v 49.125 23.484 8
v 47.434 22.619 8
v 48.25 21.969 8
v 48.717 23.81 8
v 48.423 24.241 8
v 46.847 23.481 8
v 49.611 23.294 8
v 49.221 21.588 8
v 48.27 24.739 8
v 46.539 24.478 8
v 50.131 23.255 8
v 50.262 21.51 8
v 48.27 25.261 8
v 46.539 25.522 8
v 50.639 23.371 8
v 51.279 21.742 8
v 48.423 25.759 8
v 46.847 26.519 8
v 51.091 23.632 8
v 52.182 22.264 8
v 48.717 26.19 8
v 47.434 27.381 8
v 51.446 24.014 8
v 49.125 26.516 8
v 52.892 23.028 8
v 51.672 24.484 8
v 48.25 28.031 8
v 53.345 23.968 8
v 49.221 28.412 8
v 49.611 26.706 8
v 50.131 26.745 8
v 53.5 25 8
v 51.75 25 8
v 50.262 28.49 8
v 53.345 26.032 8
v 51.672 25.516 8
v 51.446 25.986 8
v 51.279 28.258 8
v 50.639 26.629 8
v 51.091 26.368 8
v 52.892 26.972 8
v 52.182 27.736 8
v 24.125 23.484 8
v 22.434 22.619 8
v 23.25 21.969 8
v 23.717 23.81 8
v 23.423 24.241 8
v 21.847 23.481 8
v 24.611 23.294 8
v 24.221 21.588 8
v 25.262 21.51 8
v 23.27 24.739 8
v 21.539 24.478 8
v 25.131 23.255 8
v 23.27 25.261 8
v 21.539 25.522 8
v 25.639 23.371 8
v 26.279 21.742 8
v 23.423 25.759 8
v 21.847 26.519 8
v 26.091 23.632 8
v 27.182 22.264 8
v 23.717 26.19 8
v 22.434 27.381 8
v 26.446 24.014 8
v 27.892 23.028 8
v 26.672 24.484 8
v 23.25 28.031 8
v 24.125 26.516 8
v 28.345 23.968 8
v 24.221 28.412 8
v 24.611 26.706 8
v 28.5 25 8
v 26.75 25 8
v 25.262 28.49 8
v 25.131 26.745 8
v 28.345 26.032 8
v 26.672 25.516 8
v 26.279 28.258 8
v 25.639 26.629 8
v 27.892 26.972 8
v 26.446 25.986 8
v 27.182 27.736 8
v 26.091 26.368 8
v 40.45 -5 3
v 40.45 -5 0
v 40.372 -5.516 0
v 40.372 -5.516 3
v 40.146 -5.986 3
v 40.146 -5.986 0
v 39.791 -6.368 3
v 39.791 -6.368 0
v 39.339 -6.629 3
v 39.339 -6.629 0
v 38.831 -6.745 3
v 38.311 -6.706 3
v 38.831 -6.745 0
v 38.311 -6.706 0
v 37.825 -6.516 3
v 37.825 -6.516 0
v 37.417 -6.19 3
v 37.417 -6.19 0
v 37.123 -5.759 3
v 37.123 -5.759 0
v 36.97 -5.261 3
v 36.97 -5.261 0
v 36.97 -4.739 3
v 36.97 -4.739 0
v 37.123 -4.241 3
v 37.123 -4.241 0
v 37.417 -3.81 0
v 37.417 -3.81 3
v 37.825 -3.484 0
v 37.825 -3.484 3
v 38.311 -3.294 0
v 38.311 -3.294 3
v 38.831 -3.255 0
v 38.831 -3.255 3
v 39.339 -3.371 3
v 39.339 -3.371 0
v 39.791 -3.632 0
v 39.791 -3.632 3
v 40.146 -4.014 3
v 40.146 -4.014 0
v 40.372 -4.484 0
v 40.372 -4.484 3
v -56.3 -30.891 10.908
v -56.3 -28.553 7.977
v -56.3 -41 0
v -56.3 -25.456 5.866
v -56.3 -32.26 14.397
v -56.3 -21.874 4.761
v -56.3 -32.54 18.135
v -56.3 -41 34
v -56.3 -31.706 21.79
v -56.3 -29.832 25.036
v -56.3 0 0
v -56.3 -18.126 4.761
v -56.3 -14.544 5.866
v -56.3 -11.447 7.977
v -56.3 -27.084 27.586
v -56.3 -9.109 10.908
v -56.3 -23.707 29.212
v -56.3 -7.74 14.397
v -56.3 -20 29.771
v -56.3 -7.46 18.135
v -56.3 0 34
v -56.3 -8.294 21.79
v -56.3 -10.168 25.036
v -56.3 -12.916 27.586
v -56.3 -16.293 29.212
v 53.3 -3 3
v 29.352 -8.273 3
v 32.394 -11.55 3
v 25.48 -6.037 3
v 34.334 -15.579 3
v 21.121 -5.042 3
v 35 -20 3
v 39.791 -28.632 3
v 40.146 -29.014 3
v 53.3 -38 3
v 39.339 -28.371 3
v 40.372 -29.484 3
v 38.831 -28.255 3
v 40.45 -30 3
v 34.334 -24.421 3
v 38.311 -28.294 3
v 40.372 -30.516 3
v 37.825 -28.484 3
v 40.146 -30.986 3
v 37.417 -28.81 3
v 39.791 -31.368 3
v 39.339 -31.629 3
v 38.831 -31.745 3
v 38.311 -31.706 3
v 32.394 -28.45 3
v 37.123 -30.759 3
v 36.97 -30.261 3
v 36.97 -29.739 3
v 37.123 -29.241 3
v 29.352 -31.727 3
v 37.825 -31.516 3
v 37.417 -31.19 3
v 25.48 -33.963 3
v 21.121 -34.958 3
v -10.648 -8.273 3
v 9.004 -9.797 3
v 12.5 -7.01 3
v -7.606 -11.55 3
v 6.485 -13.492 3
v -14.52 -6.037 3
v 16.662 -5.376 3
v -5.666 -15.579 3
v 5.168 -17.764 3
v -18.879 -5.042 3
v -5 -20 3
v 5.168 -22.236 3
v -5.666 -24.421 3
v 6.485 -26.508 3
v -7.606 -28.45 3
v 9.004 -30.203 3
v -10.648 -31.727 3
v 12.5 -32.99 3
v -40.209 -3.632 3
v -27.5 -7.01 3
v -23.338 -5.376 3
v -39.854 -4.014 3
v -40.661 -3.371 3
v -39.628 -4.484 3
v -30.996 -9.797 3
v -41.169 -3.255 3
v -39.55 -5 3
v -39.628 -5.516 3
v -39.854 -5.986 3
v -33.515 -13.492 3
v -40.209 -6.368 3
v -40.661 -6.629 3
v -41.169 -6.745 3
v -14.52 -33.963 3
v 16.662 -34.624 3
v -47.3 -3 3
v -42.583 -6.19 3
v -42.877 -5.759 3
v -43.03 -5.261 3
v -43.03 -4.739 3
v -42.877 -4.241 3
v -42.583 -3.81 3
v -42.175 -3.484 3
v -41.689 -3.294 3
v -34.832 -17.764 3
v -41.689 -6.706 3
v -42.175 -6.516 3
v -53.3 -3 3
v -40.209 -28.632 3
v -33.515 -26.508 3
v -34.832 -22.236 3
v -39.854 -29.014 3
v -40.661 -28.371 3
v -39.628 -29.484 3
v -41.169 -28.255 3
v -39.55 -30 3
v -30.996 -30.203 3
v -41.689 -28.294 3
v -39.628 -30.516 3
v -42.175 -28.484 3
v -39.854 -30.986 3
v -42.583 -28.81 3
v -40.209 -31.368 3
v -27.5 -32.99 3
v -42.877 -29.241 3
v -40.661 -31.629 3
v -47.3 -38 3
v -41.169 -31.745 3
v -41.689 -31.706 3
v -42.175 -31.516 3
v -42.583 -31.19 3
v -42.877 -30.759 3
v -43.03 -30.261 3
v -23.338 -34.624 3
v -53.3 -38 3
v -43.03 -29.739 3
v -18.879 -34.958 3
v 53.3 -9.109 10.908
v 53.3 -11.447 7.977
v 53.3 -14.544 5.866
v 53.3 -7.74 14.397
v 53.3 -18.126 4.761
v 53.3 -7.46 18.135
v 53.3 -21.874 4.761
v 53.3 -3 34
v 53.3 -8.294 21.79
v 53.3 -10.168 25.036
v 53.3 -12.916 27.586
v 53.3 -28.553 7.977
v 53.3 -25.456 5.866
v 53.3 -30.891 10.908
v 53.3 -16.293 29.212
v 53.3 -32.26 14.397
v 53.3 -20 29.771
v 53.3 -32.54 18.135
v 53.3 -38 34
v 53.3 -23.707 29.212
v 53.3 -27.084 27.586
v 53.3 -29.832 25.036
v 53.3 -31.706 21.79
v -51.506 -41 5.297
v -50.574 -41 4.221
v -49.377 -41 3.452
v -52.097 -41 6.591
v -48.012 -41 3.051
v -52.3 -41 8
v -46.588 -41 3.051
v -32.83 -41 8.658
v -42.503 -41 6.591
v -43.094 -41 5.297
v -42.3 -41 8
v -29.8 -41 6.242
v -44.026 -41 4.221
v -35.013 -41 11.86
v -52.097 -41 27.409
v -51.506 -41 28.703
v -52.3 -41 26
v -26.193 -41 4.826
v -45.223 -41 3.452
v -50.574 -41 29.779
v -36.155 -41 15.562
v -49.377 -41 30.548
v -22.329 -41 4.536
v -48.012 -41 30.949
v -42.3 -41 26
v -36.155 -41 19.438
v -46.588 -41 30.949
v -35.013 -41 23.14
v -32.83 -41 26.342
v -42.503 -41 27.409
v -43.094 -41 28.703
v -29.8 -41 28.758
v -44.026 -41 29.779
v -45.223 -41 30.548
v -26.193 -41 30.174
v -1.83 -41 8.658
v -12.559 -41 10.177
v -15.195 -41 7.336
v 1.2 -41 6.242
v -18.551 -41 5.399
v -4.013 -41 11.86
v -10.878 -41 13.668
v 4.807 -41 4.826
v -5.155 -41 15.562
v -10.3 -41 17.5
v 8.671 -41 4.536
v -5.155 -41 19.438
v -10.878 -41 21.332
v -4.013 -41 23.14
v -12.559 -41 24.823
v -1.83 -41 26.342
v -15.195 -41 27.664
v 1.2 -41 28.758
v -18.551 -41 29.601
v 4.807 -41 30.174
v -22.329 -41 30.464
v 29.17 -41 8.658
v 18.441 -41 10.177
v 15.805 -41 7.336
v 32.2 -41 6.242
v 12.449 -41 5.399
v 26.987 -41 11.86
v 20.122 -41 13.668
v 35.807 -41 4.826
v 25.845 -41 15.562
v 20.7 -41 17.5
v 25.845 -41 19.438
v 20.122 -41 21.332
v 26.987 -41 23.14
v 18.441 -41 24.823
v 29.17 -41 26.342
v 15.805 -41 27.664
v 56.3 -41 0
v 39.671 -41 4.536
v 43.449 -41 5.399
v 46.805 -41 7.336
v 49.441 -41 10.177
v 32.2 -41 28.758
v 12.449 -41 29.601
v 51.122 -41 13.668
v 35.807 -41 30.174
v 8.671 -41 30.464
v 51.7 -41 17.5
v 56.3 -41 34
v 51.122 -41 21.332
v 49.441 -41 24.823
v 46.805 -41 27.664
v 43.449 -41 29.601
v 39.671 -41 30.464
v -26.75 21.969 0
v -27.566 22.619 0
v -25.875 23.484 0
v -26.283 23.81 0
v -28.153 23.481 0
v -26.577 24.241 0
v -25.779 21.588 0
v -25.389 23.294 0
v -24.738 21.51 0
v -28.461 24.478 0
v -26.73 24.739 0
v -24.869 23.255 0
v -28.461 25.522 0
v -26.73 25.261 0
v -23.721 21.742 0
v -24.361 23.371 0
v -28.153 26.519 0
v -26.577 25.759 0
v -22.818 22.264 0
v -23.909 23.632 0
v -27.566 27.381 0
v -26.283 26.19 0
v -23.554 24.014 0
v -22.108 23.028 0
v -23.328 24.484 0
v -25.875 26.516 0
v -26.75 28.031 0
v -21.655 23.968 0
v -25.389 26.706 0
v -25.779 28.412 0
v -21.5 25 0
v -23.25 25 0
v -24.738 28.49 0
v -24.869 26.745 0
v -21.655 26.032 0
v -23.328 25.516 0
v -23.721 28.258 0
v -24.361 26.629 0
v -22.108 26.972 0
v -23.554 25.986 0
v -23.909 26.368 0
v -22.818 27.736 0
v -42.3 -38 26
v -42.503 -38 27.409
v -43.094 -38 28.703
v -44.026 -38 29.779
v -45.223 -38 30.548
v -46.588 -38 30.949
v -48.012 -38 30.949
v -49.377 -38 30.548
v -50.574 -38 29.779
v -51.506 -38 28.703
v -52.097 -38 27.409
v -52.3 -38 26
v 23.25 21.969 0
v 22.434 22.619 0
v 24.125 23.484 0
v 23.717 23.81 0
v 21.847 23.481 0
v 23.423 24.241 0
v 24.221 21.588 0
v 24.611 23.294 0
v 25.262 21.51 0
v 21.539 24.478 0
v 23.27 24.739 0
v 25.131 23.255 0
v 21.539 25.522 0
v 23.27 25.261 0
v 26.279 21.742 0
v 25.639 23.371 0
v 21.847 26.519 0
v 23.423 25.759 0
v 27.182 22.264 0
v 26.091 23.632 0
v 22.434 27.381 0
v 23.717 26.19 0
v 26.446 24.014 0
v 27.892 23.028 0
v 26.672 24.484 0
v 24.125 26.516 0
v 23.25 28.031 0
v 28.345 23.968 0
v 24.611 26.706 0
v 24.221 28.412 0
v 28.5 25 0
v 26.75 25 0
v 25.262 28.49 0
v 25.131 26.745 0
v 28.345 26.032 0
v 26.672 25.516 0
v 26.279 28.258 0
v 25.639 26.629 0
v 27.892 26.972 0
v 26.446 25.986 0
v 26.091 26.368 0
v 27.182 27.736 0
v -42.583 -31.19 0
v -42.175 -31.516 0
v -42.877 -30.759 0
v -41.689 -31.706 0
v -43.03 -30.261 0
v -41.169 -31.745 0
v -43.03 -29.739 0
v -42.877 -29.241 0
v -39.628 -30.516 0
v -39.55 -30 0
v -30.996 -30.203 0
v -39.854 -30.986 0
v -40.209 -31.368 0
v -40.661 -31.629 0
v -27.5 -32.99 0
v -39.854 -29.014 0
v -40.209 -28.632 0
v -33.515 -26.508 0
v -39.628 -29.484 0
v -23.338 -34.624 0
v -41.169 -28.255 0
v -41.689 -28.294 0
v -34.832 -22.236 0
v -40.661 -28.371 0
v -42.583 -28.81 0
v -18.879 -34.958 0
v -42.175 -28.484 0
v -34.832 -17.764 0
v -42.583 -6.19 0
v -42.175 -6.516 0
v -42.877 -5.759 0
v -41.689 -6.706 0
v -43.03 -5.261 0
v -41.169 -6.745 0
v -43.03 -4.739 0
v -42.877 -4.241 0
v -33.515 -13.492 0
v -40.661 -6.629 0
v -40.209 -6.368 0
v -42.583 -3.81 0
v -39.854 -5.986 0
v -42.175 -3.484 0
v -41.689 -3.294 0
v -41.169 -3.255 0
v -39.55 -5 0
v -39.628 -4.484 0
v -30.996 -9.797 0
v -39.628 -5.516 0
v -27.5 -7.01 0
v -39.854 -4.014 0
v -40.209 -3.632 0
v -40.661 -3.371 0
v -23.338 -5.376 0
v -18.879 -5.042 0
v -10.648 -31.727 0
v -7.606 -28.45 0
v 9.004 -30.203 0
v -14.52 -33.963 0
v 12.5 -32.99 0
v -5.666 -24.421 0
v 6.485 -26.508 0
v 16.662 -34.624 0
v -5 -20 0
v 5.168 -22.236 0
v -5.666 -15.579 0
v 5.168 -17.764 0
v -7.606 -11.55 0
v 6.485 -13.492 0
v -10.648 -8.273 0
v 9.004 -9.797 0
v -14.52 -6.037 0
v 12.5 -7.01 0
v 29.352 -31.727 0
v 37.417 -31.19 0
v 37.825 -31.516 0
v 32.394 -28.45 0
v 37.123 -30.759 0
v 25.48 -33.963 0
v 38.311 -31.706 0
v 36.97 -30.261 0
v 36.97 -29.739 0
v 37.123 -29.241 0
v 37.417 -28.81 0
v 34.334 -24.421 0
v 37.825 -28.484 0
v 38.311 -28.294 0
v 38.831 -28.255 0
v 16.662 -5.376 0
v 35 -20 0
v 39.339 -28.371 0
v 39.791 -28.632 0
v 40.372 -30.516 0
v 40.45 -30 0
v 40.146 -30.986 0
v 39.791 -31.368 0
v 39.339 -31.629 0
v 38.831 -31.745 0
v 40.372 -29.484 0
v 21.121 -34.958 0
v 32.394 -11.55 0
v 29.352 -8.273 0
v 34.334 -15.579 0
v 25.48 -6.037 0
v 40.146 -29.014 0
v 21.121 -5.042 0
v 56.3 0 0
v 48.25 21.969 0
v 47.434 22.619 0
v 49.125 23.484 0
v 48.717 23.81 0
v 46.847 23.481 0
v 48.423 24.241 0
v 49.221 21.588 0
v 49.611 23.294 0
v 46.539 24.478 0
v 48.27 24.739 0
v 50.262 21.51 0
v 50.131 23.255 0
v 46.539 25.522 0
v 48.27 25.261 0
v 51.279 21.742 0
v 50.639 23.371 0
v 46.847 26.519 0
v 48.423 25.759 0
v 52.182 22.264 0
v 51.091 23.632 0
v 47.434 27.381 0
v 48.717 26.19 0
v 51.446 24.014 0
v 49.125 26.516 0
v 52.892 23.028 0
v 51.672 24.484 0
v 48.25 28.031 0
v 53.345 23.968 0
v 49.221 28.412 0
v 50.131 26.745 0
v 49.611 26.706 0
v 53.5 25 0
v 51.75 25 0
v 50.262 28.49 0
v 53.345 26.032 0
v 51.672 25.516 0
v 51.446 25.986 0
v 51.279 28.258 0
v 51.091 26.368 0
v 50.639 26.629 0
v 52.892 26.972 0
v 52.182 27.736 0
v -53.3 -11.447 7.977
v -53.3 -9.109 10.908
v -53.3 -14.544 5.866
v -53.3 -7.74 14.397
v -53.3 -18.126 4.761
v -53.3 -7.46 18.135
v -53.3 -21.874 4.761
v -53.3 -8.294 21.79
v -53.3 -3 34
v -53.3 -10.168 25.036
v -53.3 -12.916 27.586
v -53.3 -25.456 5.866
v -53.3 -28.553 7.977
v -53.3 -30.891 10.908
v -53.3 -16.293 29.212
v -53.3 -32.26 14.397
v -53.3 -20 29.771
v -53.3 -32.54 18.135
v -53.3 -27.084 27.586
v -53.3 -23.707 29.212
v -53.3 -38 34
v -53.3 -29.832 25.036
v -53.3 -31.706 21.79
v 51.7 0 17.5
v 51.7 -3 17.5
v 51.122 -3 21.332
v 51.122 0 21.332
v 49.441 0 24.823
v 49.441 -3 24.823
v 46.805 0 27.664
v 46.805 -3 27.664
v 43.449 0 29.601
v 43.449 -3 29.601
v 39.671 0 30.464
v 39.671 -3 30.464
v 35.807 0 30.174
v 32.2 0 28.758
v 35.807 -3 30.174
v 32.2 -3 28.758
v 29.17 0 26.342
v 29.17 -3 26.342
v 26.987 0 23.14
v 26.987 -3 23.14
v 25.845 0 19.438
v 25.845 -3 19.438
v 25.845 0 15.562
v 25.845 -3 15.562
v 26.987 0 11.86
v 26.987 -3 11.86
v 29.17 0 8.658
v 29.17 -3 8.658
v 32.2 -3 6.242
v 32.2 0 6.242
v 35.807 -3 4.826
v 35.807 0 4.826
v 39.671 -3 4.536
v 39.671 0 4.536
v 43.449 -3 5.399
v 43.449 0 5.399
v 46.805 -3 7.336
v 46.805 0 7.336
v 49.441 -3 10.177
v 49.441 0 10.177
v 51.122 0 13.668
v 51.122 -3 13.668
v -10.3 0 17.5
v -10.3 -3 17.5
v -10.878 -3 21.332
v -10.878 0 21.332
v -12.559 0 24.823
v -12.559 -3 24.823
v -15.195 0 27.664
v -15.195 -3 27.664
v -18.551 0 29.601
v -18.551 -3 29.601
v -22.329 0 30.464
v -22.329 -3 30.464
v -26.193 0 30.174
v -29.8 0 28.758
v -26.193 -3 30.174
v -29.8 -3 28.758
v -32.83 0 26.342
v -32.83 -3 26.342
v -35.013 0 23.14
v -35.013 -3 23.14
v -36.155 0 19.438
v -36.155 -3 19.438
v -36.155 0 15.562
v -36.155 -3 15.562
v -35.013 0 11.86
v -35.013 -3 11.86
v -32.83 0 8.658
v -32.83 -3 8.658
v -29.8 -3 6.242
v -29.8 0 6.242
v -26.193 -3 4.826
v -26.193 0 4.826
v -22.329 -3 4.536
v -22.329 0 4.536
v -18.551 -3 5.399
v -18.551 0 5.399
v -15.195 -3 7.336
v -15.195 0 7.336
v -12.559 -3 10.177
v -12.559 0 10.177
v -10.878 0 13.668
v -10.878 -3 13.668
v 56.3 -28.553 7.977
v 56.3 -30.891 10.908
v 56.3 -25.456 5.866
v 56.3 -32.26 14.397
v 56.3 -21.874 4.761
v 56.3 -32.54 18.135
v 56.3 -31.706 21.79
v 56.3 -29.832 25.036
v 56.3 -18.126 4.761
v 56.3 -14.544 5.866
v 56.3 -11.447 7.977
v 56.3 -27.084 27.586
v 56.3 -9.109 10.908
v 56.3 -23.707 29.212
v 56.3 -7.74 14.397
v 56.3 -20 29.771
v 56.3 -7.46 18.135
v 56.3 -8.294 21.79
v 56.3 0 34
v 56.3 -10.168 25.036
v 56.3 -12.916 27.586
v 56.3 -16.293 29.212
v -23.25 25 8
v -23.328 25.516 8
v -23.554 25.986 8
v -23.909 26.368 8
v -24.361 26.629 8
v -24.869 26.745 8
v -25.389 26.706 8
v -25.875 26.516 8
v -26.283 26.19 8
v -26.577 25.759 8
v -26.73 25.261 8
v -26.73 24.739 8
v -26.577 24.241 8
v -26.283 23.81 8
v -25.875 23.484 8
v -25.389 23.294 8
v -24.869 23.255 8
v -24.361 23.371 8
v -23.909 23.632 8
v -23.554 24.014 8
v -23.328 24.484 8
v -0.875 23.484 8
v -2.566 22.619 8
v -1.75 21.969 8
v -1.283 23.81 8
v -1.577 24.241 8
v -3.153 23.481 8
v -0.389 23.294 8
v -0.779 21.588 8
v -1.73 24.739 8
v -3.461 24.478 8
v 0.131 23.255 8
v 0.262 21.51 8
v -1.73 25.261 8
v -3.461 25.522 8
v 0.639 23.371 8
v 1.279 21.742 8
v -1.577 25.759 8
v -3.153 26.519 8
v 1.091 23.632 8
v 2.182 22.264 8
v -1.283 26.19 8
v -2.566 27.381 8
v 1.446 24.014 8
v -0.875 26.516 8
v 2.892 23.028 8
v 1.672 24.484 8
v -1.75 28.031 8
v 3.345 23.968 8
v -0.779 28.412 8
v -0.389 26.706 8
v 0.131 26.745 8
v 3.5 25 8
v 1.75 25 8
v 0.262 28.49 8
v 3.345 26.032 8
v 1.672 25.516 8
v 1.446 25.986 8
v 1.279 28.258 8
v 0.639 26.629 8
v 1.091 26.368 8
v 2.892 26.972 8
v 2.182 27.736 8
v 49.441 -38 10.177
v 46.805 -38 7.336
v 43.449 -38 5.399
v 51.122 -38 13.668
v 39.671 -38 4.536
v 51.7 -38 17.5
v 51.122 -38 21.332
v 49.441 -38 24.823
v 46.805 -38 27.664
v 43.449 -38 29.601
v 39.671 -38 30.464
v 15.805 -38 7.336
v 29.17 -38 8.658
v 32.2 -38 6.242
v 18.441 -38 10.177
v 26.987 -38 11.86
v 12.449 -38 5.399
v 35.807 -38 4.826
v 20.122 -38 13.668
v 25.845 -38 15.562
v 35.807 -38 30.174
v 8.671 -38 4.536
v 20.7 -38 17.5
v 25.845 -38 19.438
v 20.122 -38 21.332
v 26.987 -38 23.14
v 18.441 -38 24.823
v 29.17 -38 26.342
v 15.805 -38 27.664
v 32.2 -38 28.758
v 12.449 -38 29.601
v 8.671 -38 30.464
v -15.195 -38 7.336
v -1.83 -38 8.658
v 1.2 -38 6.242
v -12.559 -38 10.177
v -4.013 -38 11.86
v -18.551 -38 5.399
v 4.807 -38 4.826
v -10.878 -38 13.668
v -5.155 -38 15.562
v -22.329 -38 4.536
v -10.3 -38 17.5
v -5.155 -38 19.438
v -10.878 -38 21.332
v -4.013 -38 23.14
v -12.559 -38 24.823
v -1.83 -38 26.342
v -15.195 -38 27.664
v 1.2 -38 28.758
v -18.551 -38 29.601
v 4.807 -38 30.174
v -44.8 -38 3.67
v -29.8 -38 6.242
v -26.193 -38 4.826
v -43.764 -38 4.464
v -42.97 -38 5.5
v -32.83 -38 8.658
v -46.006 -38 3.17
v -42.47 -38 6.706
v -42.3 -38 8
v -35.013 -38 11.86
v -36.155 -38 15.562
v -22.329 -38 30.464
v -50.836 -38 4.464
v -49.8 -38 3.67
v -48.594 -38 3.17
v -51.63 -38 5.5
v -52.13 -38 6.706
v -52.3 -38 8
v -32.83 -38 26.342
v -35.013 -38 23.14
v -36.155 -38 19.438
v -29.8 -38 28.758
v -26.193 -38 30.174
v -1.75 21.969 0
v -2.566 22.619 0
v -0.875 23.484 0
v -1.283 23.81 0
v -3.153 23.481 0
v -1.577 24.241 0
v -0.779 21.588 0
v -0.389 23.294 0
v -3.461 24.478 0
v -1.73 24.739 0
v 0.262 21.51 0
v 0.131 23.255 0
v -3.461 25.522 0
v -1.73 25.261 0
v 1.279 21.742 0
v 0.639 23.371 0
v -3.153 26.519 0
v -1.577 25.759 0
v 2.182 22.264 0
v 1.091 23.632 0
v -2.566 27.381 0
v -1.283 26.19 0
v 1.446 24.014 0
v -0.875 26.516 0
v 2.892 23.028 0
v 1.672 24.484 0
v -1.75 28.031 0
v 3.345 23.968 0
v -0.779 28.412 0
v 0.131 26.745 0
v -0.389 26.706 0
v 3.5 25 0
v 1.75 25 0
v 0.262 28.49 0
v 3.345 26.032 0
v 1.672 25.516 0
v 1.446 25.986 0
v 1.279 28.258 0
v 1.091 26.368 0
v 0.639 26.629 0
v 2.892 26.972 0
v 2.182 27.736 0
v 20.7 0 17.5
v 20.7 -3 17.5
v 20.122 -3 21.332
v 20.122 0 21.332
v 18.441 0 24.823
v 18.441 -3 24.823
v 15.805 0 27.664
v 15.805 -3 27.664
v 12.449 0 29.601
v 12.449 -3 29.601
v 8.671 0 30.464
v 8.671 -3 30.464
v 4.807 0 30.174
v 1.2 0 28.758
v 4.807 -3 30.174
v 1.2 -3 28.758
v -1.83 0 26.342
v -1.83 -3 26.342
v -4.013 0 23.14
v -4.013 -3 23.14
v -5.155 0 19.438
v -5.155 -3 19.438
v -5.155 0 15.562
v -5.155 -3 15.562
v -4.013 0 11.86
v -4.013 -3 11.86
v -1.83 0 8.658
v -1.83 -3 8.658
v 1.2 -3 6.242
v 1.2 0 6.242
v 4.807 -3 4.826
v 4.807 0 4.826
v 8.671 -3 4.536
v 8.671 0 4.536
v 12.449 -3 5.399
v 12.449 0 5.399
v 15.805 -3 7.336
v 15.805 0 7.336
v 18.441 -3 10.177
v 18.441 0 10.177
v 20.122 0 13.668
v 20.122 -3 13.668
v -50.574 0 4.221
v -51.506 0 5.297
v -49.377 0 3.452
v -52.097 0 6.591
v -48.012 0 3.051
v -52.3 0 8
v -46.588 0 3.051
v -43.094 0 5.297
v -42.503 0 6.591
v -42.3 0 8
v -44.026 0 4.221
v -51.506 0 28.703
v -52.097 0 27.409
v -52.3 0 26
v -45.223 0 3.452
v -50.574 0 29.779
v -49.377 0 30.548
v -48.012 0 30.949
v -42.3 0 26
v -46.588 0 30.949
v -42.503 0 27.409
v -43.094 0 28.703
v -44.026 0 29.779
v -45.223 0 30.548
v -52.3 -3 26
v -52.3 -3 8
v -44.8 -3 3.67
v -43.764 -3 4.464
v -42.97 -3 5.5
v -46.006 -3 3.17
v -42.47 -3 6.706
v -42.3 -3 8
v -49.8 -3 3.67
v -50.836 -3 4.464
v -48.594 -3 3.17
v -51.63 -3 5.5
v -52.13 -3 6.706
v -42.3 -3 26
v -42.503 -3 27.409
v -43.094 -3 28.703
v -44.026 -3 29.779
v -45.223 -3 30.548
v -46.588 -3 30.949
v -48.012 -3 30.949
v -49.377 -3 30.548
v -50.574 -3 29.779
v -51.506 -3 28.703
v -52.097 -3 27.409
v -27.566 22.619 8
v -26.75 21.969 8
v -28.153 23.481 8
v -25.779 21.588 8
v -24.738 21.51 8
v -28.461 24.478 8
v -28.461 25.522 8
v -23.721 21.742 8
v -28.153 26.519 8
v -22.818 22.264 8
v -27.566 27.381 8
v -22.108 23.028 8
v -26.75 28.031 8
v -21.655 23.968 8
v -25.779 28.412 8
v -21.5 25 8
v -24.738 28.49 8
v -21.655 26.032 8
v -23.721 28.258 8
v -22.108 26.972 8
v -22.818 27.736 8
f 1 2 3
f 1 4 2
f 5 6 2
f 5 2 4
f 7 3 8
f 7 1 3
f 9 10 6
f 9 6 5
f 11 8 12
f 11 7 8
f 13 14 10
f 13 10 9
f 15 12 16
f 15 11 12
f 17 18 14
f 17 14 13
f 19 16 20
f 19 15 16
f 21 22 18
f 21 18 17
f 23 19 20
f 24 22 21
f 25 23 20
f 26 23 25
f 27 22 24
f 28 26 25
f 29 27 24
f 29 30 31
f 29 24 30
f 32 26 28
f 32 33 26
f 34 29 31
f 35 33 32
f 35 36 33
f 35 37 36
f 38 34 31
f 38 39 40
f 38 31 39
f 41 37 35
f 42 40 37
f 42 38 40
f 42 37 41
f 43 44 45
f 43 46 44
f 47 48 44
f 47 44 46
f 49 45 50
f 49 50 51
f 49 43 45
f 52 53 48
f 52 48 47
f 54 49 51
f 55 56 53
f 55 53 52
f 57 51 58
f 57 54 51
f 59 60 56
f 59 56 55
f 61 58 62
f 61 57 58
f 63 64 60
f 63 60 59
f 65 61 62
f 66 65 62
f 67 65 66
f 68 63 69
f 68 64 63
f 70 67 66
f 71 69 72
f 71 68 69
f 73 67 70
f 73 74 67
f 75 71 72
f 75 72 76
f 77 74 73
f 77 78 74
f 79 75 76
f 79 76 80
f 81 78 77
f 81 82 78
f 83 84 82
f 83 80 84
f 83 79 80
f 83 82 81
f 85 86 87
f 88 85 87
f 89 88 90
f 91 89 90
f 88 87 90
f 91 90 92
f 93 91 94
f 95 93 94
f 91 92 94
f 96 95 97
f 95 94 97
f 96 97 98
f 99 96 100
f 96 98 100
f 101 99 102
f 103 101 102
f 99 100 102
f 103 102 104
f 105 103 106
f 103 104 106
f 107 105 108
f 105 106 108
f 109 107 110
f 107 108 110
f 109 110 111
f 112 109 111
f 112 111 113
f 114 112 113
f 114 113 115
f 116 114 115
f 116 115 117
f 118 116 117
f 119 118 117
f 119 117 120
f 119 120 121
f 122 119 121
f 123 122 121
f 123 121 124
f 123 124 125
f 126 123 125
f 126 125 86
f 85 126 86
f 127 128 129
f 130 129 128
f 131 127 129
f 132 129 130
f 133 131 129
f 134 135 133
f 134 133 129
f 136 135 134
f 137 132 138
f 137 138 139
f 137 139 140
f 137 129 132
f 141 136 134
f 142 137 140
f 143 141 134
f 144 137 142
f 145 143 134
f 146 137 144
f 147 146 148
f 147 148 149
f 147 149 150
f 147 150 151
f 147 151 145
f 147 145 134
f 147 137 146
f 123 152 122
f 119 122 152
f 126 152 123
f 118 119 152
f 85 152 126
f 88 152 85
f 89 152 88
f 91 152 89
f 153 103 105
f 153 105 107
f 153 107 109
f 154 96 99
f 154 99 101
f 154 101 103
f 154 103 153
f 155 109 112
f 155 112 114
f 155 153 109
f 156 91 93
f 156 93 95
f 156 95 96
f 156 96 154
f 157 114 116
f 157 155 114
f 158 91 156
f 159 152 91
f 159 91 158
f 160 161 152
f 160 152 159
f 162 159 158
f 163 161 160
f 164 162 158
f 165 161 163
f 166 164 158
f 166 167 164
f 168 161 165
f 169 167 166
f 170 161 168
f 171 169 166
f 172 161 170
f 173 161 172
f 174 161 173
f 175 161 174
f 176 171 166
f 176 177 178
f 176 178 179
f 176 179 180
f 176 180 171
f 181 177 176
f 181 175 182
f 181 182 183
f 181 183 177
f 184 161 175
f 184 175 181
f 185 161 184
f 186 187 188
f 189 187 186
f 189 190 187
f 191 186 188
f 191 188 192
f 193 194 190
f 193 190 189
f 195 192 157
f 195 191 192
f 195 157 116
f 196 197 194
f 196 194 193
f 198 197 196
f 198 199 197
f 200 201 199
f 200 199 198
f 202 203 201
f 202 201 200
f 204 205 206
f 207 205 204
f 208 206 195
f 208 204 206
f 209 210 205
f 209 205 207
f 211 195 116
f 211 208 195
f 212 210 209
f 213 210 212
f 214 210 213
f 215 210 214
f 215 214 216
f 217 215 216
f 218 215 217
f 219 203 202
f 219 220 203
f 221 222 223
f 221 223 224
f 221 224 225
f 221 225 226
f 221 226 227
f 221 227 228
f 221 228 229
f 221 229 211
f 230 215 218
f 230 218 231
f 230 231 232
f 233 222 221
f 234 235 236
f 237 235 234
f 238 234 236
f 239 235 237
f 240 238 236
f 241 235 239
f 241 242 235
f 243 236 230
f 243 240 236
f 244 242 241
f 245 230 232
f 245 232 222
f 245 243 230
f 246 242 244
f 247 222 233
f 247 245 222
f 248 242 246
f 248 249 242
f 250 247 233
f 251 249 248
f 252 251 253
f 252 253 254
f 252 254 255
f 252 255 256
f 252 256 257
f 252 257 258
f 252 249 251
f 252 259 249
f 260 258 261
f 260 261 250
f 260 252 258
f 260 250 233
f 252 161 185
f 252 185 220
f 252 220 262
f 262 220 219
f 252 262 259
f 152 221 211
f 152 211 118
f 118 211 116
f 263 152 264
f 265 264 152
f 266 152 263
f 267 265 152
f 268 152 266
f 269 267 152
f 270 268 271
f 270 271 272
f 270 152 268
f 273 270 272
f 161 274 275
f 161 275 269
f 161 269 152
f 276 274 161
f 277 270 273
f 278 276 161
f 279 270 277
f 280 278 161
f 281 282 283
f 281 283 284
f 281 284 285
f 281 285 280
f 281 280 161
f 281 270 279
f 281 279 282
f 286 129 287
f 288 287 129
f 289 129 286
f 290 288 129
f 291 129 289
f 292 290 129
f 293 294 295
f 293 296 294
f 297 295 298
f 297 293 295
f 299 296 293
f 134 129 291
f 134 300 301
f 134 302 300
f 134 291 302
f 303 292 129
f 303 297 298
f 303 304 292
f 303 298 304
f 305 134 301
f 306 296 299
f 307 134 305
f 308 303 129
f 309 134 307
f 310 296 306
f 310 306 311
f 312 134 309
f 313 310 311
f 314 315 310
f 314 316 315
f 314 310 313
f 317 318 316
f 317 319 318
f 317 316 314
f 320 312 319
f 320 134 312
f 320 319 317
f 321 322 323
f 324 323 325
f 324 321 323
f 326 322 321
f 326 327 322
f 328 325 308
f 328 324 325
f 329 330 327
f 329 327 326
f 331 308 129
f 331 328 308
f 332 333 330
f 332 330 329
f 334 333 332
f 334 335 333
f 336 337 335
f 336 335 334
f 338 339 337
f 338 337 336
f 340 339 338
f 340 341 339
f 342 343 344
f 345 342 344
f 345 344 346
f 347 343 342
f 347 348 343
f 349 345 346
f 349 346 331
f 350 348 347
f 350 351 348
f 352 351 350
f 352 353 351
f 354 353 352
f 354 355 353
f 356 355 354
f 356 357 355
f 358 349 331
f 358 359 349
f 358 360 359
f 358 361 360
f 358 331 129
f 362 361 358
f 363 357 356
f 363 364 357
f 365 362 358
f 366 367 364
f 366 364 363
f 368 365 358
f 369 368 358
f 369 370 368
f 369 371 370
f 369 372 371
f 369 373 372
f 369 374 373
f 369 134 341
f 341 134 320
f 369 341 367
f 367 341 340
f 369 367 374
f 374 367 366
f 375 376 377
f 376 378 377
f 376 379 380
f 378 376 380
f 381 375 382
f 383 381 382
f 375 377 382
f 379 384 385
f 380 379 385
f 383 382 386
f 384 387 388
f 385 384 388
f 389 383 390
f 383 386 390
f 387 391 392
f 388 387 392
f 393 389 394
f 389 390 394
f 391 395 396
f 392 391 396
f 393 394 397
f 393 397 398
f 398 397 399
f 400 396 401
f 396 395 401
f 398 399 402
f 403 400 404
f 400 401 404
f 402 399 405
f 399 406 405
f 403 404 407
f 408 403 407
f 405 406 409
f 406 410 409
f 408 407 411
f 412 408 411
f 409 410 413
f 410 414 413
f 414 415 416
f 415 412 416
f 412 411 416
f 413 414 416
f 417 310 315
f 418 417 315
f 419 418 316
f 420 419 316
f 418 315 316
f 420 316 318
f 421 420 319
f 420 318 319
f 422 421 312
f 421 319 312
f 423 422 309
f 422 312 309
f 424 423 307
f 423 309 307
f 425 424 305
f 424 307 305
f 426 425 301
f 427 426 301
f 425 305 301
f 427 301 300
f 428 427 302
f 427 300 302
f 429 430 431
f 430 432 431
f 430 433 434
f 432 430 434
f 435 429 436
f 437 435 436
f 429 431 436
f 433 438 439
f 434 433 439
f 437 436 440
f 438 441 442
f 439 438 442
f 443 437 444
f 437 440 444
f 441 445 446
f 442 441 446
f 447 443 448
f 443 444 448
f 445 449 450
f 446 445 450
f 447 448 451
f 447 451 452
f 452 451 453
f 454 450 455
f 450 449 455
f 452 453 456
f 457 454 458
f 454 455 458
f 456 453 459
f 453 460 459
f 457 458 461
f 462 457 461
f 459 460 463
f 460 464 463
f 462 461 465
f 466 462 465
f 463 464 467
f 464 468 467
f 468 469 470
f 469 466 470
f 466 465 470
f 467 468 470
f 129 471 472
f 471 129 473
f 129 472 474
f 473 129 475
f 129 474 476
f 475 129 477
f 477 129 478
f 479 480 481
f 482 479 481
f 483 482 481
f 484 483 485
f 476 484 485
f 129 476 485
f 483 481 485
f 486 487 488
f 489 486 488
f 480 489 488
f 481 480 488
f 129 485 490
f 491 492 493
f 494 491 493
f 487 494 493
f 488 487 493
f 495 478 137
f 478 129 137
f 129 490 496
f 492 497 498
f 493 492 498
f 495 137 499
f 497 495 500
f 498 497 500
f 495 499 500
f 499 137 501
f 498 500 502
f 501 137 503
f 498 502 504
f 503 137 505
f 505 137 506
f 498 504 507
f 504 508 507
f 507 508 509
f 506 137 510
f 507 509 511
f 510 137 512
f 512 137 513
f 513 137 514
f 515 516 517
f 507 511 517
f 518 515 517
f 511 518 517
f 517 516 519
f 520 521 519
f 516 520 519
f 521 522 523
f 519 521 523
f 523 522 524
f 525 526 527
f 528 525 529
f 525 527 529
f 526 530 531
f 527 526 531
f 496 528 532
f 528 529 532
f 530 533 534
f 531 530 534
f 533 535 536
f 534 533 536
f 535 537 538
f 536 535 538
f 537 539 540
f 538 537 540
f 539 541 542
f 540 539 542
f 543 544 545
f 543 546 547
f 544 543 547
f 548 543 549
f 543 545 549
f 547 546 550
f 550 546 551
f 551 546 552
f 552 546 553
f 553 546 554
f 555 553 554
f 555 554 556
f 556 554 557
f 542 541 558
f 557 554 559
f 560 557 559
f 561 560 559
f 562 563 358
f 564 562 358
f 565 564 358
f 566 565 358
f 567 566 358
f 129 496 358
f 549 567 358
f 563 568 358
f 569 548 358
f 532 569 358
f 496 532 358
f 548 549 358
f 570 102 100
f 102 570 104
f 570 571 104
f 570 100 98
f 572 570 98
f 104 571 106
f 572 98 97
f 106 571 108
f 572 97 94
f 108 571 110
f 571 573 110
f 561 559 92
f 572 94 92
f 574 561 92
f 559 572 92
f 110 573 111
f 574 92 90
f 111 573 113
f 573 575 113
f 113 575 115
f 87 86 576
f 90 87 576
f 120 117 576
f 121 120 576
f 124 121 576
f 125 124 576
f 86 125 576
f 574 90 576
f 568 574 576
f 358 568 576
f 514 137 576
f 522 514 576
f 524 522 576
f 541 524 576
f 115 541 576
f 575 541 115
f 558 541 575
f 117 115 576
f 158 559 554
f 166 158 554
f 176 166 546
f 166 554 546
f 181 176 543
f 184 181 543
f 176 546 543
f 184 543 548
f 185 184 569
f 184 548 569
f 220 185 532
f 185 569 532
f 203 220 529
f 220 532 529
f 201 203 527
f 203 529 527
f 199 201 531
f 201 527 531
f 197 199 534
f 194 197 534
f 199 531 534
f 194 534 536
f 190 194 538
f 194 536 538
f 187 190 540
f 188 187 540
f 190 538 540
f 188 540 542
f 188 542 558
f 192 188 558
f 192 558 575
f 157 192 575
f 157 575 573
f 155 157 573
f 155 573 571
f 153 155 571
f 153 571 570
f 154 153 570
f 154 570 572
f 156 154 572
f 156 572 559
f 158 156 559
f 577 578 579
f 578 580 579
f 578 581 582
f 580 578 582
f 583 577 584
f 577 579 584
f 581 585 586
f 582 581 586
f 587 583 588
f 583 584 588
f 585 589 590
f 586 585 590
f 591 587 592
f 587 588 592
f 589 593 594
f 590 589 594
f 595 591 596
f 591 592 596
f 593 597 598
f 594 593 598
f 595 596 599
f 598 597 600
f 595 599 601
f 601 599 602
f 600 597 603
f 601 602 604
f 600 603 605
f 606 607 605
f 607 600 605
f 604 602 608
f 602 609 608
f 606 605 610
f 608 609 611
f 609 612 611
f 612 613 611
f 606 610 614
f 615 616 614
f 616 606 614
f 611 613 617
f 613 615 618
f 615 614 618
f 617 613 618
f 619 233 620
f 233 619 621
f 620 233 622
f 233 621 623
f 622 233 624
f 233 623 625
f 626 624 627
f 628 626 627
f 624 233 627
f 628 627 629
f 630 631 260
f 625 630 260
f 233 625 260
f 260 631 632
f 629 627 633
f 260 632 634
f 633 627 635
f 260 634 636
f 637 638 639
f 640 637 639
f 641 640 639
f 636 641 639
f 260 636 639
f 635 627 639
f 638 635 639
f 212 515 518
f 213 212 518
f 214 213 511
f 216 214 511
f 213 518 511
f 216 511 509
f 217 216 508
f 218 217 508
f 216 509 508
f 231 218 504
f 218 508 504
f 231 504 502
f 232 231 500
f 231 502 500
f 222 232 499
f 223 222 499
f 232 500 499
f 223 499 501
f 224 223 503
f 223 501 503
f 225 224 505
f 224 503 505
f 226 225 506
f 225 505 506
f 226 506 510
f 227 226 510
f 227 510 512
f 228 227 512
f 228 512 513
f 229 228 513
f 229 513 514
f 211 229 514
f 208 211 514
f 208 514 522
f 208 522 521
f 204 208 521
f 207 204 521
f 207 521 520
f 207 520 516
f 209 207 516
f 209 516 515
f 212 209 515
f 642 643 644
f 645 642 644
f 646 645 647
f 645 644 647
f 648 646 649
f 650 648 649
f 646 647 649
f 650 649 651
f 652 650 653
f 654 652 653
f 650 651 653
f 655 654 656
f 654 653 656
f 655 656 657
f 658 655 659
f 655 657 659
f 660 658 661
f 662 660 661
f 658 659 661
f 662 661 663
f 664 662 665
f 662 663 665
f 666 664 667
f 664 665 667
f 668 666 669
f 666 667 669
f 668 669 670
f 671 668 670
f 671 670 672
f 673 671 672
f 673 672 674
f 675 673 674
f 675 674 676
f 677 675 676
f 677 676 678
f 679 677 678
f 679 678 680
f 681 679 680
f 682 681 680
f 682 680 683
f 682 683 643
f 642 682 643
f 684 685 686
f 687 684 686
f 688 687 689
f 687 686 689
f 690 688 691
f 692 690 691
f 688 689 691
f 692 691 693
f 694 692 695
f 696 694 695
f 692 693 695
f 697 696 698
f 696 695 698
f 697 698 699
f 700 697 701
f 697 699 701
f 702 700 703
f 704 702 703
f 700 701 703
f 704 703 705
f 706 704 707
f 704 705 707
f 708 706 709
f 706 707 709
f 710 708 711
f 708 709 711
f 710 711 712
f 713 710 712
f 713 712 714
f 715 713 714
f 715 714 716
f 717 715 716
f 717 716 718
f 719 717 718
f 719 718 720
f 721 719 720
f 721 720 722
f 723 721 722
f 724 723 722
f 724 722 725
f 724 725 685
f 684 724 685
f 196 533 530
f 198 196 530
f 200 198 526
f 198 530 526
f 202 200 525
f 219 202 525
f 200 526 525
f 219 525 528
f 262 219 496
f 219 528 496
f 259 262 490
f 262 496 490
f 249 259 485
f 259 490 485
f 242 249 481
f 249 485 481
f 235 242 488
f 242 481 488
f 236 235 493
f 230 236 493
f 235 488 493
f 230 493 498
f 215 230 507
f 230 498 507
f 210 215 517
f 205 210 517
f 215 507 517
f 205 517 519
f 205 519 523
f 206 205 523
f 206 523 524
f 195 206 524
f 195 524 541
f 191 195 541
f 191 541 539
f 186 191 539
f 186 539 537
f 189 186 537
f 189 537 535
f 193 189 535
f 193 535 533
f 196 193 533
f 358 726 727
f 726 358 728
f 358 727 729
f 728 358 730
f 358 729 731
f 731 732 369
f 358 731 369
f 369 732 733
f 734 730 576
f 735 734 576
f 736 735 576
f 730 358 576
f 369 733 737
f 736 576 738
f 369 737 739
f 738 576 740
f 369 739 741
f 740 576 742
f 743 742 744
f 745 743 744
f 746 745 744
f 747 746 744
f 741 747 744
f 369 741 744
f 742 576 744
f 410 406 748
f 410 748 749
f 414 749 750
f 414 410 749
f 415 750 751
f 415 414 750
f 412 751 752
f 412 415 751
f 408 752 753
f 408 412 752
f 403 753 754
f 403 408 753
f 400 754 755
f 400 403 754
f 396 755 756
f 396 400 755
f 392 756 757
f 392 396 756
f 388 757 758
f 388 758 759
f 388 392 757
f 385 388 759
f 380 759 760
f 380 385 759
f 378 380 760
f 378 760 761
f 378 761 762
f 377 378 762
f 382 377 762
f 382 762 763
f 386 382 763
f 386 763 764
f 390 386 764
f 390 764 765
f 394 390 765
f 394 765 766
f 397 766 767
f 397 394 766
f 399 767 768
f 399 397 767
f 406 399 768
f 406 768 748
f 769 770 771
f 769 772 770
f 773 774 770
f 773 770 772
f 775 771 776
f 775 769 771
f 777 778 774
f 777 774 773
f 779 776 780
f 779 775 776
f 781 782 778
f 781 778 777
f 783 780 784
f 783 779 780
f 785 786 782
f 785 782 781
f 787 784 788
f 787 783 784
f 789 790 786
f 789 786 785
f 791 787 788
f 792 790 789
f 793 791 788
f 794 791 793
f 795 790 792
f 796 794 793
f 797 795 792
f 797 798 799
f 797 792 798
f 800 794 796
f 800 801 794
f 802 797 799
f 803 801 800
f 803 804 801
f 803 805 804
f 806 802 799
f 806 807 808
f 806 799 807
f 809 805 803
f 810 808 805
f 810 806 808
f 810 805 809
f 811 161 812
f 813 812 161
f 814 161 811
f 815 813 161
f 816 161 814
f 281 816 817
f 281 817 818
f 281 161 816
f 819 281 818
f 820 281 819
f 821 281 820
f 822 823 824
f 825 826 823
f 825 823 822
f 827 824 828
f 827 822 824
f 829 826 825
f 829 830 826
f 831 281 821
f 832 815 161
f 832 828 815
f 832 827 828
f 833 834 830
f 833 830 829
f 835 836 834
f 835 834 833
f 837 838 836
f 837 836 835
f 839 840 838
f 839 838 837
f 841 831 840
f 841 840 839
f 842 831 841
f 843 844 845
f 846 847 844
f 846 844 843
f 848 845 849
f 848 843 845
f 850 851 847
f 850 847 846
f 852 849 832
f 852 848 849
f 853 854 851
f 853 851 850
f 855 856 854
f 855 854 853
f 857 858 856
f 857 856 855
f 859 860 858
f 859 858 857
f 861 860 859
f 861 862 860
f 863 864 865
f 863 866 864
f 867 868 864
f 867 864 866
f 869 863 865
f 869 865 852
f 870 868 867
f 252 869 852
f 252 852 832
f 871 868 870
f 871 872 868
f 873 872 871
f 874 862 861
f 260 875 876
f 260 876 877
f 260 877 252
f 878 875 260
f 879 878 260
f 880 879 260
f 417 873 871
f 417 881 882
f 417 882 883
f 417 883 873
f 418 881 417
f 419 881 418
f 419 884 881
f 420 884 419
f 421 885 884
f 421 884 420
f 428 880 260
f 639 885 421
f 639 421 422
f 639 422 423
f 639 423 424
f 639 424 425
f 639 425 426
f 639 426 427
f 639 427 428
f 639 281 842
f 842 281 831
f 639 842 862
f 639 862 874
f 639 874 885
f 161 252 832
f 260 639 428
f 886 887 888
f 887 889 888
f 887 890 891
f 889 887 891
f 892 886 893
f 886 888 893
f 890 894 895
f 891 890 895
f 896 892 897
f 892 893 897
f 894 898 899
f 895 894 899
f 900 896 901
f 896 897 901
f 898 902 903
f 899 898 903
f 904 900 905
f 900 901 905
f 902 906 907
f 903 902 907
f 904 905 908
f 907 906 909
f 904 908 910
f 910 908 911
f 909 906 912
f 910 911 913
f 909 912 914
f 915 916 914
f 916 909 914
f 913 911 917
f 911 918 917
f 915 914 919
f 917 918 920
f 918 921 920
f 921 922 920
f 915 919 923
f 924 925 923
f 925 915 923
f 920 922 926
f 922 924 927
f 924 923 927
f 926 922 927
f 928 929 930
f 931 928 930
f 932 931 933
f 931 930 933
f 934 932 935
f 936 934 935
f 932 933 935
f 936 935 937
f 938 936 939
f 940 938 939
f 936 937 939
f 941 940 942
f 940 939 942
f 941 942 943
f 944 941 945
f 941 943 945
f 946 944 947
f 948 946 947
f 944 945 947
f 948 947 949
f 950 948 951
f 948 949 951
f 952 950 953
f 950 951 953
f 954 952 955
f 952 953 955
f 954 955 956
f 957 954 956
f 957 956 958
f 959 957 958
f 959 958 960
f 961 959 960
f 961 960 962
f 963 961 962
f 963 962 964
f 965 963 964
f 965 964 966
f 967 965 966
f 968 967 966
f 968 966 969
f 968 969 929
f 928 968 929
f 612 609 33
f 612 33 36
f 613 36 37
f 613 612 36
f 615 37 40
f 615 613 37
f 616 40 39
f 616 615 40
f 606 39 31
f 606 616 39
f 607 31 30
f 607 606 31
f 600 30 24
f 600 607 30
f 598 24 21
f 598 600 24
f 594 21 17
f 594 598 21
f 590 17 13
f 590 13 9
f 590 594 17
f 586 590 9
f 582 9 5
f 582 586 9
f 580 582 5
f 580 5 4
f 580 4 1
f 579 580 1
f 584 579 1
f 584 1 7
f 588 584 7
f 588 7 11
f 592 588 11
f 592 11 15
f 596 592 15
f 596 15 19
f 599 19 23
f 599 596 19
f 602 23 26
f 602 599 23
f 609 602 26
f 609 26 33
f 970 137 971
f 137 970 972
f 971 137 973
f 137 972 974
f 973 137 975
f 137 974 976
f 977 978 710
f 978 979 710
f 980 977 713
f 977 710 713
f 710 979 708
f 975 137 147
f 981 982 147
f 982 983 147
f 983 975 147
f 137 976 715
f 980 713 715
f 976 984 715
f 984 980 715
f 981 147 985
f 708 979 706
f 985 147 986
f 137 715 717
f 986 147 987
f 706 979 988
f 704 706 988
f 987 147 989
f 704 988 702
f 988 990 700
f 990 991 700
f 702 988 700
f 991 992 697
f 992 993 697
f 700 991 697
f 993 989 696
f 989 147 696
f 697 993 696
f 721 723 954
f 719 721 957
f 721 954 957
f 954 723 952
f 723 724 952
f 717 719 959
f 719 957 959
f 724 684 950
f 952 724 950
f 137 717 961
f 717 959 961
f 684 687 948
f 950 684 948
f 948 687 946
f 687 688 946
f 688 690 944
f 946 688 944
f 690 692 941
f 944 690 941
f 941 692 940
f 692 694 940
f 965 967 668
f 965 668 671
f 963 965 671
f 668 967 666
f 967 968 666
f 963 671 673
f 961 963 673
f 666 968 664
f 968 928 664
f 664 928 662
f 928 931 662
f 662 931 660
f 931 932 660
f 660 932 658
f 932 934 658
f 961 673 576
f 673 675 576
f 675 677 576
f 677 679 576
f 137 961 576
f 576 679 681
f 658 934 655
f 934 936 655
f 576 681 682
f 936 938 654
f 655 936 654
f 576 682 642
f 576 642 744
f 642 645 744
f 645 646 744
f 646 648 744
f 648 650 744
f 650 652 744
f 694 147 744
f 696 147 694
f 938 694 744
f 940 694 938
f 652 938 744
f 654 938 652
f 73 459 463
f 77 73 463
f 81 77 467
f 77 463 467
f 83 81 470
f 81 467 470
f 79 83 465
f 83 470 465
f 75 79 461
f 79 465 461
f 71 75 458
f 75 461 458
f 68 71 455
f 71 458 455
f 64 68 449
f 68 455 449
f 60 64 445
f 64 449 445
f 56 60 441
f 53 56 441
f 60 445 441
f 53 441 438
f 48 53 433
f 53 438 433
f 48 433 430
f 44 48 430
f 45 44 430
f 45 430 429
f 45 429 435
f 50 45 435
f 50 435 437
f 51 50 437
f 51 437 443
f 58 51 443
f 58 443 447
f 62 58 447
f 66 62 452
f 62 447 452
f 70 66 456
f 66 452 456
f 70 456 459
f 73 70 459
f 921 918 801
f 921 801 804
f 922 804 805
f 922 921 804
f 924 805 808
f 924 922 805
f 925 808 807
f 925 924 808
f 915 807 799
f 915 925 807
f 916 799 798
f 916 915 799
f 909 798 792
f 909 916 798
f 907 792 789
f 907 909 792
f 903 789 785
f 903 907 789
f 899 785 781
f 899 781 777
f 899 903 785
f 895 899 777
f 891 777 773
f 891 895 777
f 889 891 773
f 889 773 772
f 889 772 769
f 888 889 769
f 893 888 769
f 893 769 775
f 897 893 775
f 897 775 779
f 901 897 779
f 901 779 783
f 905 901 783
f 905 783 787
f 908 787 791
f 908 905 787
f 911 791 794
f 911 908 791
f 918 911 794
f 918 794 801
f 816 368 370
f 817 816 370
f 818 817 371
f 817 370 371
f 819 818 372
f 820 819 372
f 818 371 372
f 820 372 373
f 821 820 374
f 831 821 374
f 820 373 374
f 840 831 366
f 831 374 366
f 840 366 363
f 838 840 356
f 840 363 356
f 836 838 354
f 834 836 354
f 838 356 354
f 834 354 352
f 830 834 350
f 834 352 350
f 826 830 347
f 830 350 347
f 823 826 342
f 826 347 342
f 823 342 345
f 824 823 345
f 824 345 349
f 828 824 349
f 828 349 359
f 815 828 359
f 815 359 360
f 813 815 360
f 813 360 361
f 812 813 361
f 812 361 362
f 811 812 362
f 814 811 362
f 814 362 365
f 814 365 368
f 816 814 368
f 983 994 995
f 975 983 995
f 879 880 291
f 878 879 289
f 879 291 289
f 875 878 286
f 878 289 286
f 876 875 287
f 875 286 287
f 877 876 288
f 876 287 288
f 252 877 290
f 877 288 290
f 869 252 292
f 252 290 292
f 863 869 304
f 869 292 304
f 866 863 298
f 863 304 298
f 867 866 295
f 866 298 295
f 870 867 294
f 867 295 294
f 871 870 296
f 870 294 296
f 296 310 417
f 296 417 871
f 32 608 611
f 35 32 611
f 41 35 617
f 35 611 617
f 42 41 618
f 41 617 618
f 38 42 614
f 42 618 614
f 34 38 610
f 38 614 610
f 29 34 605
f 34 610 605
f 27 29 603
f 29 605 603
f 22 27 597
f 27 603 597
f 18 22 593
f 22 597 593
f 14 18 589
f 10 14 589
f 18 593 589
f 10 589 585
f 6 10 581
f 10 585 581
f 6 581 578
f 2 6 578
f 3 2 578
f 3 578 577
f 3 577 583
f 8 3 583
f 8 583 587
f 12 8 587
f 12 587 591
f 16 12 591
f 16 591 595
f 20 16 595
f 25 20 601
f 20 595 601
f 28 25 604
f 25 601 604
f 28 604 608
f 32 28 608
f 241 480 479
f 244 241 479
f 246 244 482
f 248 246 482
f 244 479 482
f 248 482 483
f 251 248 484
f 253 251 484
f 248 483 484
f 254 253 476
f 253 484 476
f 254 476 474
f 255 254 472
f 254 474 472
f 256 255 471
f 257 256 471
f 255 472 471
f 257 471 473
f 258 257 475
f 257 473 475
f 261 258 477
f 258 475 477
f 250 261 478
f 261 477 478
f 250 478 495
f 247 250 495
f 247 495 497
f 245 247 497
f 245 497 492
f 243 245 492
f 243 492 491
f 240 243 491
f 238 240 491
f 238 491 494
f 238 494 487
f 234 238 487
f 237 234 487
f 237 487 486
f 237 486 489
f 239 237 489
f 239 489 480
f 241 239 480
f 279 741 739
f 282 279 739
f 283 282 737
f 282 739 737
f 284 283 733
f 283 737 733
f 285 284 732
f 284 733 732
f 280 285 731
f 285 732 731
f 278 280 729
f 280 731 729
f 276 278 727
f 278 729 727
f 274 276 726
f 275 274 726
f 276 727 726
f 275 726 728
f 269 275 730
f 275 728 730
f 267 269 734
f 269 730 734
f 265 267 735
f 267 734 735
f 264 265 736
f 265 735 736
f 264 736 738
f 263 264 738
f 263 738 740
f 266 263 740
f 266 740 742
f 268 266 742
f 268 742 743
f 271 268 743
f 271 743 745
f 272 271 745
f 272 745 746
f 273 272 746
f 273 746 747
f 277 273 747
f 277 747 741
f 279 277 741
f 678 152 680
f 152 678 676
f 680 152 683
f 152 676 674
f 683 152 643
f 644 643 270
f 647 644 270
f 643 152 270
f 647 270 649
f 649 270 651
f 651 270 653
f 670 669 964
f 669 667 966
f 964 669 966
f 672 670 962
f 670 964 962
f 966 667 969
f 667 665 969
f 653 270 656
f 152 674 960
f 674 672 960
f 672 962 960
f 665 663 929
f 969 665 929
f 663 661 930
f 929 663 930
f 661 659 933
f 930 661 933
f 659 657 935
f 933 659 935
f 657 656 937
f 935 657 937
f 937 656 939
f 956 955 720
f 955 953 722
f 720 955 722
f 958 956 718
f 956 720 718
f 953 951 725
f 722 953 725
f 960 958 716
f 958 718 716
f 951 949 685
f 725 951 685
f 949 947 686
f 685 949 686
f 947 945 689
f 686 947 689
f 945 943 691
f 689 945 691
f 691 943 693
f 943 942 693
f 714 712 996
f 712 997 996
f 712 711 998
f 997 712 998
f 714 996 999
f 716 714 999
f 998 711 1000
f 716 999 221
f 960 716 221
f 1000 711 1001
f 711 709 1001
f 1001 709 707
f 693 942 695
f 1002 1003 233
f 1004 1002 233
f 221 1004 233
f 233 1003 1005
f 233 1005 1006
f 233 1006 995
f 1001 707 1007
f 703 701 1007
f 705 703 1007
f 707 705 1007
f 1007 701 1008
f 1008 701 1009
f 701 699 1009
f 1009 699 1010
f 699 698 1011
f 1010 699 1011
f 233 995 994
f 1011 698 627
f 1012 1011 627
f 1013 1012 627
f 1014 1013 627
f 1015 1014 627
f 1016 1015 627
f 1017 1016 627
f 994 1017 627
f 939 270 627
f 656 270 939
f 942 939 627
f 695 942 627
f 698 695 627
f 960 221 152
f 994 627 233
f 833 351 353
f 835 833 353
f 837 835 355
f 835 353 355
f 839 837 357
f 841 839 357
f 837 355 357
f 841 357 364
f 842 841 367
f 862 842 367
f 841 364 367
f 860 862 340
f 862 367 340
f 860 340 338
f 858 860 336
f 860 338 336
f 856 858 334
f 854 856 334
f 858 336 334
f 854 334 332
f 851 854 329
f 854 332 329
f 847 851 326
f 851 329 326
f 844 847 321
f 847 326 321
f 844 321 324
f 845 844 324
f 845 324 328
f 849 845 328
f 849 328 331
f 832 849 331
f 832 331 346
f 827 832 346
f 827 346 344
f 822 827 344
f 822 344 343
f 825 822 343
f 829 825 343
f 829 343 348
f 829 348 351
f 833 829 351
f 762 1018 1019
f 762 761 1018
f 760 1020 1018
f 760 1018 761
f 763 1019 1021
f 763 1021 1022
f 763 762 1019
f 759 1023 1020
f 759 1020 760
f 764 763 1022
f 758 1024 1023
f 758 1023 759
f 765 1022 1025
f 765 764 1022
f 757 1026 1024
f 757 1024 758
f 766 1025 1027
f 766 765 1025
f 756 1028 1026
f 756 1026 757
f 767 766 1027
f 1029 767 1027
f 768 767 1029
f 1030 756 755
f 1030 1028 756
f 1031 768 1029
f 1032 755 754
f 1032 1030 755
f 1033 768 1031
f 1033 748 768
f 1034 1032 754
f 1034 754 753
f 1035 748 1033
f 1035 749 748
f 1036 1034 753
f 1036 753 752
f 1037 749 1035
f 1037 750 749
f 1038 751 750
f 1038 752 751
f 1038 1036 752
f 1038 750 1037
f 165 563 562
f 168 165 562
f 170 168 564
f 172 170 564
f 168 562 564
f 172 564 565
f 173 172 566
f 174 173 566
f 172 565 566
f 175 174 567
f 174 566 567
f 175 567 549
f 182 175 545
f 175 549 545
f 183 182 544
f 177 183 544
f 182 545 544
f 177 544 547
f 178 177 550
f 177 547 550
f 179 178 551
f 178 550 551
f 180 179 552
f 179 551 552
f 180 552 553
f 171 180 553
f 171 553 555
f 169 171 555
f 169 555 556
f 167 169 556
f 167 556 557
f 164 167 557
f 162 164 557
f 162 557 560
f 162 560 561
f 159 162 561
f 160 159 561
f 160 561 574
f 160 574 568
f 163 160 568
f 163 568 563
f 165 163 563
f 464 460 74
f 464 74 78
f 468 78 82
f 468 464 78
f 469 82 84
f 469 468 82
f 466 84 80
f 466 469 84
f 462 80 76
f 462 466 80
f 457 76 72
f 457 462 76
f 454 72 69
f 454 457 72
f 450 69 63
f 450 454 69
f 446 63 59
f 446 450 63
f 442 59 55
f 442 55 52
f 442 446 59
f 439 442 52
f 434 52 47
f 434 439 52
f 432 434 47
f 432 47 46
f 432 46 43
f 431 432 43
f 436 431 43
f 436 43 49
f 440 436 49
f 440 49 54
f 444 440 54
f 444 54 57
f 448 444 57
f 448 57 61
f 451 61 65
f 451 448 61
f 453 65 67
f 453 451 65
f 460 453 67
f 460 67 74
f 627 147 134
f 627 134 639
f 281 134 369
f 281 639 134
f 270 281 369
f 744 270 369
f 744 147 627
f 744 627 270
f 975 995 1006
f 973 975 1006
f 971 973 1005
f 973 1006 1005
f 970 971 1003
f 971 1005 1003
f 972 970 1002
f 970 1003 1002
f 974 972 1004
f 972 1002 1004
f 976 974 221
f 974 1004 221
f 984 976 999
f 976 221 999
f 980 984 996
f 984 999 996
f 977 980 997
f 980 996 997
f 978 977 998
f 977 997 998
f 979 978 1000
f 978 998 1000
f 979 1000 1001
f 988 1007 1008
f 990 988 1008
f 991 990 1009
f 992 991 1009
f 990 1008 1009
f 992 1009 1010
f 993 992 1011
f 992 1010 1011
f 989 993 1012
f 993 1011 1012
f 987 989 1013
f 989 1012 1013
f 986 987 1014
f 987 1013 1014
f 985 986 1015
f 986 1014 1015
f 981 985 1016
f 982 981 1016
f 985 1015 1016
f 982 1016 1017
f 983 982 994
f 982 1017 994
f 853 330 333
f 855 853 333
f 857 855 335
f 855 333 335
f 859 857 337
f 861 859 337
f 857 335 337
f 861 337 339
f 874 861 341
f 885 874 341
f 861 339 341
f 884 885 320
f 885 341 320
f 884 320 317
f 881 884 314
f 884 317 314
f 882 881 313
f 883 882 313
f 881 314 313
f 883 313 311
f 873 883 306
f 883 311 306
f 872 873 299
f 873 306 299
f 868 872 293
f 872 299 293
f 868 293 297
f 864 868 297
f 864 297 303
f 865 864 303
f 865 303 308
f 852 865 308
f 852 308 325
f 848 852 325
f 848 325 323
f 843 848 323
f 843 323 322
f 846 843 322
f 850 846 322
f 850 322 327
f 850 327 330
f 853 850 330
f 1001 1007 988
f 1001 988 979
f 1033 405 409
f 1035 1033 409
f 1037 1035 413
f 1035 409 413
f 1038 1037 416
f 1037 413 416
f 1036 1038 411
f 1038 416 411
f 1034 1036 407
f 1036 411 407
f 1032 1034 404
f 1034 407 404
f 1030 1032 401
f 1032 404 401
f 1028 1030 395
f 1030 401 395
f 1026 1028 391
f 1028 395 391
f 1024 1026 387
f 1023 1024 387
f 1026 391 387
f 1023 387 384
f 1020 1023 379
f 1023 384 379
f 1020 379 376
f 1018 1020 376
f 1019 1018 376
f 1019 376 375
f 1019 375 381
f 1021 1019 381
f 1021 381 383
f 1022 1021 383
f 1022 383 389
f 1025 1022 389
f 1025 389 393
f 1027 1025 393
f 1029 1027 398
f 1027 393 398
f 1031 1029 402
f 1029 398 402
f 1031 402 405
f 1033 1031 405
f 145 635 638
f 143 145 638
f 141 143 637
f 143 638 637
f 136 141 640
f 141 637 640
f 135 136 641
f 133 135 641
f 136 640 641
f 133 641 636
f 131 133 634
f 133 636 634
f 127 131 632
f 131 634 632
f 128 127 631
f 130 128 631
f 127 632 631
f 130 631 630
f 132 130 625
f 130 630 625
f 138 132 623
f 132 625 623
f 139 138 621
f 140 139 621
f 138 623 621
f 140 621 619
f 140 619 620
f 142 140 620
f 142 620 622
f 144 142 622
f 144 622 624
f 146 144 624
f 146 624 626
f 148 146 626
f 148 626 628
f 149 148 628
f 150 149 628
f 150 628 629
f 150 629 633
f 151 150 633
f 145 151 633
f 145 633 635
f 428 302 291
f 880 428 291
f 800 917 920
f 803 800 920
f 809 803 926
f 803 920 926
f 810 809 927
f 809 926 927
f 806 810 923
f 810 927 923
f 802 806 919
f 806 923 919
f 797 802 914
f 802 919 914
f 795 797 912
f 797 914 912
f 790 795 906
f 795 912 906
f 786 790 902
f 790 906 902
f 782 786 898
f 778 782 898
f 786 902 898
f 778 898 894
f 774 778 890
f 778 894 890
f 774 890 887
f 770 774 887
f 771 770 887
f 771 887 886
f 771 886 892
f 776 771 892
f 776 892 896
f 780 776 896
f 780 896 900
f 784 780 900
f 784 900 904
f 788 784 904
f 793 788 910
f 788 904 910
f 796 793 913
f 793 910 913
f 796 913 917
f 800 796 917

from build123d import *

# Parameters (mm, degrees)
SKETCH_R        = 3.5
SKETCH_R_2      = 1.75
PAD_DEPTH       = 8
SKETCH001_W     = 112.6
SKETCH001_H     = 34
PAD001_DEPTH    = 41
SKETCH002_W     = 106.6
SKETCH002_H     = 35
POCKET_DEPTH    = 31
SKETCH004_R     = 13
POCKET001_DEPTH = 41.001
SKETCH003_R     = 1.75
SKETCH003_R_2   = 15
POCKET002_DEPTH = 5
SKETCH005_R     = 12.575466
POCKET003_DEPTH = 112.601
SKETCH006_R     = 3.5
SKETCH006_R_2   = 1.75
PAD002_DEPTH    = 8
SKETCH007_R     = 3.5
SKETCH007_R_2   = 1.75
PAD003_DEPTH    = 8
SKETCH008_R     = 3.5
SKETCH008_R_2   = 1.75
PAD004_DEPTH    = 8


with BuildPart() as pad:
    # Sketch → Pad (new body)
    with BuildSketch(Plane(origin=(50, 25, 0), x_dir=(1, 0, 0), z_dir=(0, 0, 1))):
        Circle(SKETCH_R)
        Circle(SKETCH_R_2, mode=Mode.SUBTRACT)
    extrude(amount=PAD_DEPTH)


with BuildPart() as battery_box:
    # Sketch001 → Pad001 (new body)
    with BuildSketch(Plane.XZ):
        with Locations((0, 17)):
            Rectangle(SKETCH001_W, SKETCH001_H)
    extrude(amount=PAD001_DEPTH)

    # Sketch002 → Pocket (cut)
    with BuildSketch(Plane(origin=(0, 0, 34), x_dir=(-1, 0, 0), z_dir=(0, 0, 1))):
        with Locations((0, 20.5)):
            Rectangle(SKETCH002_W, SKETCH002_H)
    extrude(amount=-POCKET_DEPTH, mode=Mode.SUBTRACT)

    # Sketch004 → Pocket001 (cut, through all)
    with BuildSketch(Plane.XZ.offset(41)):
        with Locations((-23.3, 17.5)):
            Circle(SKETCH004_R)
        with Locations((7.7, 17.5)):
            Circle(SKETCH004_R)
        with Locations((38.7, 17.5)):
            Circle(SKETCH004_R)
        with BuildLine():
            ThreePointArc((-42.3, 26), (-47.3, 31), (-52.3, 26))
            Line((-52.3, 26), (-52.3, 8.000019))
            ThreePointArc((-52.3, 8.000019), (-47.3, 3), (-42.3, 8.000019))
            Line((-42.3, 26), (-42.3, 8.000019))
        make_face()
    extrude(amount=-POCKET001_DEPTH, mode=Mode.SUBTRACT)

    # Sketch003 → Pocket002 (cut)
    with BuildSketch(Plane(origin=(0, 0, 0), x_dir=(1, 0, 0), z_dir=(0, 0, -1))):
        with Locations((-41.3, 30)):
            Circle(SKETCH003_R)
        with Locations((38.7, 30)):
            Circle(SKETCH003_R)
        with Locations((-41.3, 5)):
            Circle(SKETCH003_R)
        with Locations((38.7, 5)):
            Circle(SKETCH003_R)
        with Locations((-20, 20)):
            Circle(SKETCH003_R_2)
        with Locations((20, 20)):
            Circle(SKETCH003_R_2)
    extrude(amount=-POCKET002_DEPTH, mode=Mode.SUBTRACT)

    # Sketch005 → Pocket003 (cut, through all)
    with BuildSketch(Plane(origin=(56.3, 0, 0), x_dir=(0, 0, 1), z_dir=(1, 0, 0))):
        with Locations((17.195639, 20)):
            Circle(SKETCH005_R)
    extrude(amount=-POCKET003_DEPTH, mode=Mode.SUBTRACT)


with BuildPart() as pad002:
    # Sketch006 → Pad002 (new body)
    with BuildSketch(Plane(origin=(-25, 25, 0), x_dir=(1, 0, 0), z_dir=(0, 0, 1))):
        Circle(SKETCH006_R)
        Circle(SKETCH006_R_2, mode=Mode.SUBTRACT)
    extrude(amount=PAD002_DEPTH)


with BuildPart() as pad003:
    # Sketch007 → Pad003 (new body)
    with BuildSketch(Plane(origin=(25, 25, 0), x_dir=(1, 0, 0), z_dir=(0, 0, 1))):
        Circle(SKETCH007_R)
        Circle(SKETCH007_R_2, mode=Mode.SUBTRACT)
    extrude(amount=PAD003_DEPTH)


with BuildPart() as pad004:
    # Sketch008 → Pad004 (new body)
    with BuildSketch(Plane(origin=(0, 25, 0), x_dir=(1, 0, 0), z_dir=(0, 0, 1))):
        Circle(SKETCH008_R)
        Circle(SKETCH008_R_2, mode=Mode.SUBTRACT)
    extrude(amount=PAD004_DEPTH)


solid = Compound([pad.part, battery_box.part, pad002.part, pad003.part, pad004.part])
